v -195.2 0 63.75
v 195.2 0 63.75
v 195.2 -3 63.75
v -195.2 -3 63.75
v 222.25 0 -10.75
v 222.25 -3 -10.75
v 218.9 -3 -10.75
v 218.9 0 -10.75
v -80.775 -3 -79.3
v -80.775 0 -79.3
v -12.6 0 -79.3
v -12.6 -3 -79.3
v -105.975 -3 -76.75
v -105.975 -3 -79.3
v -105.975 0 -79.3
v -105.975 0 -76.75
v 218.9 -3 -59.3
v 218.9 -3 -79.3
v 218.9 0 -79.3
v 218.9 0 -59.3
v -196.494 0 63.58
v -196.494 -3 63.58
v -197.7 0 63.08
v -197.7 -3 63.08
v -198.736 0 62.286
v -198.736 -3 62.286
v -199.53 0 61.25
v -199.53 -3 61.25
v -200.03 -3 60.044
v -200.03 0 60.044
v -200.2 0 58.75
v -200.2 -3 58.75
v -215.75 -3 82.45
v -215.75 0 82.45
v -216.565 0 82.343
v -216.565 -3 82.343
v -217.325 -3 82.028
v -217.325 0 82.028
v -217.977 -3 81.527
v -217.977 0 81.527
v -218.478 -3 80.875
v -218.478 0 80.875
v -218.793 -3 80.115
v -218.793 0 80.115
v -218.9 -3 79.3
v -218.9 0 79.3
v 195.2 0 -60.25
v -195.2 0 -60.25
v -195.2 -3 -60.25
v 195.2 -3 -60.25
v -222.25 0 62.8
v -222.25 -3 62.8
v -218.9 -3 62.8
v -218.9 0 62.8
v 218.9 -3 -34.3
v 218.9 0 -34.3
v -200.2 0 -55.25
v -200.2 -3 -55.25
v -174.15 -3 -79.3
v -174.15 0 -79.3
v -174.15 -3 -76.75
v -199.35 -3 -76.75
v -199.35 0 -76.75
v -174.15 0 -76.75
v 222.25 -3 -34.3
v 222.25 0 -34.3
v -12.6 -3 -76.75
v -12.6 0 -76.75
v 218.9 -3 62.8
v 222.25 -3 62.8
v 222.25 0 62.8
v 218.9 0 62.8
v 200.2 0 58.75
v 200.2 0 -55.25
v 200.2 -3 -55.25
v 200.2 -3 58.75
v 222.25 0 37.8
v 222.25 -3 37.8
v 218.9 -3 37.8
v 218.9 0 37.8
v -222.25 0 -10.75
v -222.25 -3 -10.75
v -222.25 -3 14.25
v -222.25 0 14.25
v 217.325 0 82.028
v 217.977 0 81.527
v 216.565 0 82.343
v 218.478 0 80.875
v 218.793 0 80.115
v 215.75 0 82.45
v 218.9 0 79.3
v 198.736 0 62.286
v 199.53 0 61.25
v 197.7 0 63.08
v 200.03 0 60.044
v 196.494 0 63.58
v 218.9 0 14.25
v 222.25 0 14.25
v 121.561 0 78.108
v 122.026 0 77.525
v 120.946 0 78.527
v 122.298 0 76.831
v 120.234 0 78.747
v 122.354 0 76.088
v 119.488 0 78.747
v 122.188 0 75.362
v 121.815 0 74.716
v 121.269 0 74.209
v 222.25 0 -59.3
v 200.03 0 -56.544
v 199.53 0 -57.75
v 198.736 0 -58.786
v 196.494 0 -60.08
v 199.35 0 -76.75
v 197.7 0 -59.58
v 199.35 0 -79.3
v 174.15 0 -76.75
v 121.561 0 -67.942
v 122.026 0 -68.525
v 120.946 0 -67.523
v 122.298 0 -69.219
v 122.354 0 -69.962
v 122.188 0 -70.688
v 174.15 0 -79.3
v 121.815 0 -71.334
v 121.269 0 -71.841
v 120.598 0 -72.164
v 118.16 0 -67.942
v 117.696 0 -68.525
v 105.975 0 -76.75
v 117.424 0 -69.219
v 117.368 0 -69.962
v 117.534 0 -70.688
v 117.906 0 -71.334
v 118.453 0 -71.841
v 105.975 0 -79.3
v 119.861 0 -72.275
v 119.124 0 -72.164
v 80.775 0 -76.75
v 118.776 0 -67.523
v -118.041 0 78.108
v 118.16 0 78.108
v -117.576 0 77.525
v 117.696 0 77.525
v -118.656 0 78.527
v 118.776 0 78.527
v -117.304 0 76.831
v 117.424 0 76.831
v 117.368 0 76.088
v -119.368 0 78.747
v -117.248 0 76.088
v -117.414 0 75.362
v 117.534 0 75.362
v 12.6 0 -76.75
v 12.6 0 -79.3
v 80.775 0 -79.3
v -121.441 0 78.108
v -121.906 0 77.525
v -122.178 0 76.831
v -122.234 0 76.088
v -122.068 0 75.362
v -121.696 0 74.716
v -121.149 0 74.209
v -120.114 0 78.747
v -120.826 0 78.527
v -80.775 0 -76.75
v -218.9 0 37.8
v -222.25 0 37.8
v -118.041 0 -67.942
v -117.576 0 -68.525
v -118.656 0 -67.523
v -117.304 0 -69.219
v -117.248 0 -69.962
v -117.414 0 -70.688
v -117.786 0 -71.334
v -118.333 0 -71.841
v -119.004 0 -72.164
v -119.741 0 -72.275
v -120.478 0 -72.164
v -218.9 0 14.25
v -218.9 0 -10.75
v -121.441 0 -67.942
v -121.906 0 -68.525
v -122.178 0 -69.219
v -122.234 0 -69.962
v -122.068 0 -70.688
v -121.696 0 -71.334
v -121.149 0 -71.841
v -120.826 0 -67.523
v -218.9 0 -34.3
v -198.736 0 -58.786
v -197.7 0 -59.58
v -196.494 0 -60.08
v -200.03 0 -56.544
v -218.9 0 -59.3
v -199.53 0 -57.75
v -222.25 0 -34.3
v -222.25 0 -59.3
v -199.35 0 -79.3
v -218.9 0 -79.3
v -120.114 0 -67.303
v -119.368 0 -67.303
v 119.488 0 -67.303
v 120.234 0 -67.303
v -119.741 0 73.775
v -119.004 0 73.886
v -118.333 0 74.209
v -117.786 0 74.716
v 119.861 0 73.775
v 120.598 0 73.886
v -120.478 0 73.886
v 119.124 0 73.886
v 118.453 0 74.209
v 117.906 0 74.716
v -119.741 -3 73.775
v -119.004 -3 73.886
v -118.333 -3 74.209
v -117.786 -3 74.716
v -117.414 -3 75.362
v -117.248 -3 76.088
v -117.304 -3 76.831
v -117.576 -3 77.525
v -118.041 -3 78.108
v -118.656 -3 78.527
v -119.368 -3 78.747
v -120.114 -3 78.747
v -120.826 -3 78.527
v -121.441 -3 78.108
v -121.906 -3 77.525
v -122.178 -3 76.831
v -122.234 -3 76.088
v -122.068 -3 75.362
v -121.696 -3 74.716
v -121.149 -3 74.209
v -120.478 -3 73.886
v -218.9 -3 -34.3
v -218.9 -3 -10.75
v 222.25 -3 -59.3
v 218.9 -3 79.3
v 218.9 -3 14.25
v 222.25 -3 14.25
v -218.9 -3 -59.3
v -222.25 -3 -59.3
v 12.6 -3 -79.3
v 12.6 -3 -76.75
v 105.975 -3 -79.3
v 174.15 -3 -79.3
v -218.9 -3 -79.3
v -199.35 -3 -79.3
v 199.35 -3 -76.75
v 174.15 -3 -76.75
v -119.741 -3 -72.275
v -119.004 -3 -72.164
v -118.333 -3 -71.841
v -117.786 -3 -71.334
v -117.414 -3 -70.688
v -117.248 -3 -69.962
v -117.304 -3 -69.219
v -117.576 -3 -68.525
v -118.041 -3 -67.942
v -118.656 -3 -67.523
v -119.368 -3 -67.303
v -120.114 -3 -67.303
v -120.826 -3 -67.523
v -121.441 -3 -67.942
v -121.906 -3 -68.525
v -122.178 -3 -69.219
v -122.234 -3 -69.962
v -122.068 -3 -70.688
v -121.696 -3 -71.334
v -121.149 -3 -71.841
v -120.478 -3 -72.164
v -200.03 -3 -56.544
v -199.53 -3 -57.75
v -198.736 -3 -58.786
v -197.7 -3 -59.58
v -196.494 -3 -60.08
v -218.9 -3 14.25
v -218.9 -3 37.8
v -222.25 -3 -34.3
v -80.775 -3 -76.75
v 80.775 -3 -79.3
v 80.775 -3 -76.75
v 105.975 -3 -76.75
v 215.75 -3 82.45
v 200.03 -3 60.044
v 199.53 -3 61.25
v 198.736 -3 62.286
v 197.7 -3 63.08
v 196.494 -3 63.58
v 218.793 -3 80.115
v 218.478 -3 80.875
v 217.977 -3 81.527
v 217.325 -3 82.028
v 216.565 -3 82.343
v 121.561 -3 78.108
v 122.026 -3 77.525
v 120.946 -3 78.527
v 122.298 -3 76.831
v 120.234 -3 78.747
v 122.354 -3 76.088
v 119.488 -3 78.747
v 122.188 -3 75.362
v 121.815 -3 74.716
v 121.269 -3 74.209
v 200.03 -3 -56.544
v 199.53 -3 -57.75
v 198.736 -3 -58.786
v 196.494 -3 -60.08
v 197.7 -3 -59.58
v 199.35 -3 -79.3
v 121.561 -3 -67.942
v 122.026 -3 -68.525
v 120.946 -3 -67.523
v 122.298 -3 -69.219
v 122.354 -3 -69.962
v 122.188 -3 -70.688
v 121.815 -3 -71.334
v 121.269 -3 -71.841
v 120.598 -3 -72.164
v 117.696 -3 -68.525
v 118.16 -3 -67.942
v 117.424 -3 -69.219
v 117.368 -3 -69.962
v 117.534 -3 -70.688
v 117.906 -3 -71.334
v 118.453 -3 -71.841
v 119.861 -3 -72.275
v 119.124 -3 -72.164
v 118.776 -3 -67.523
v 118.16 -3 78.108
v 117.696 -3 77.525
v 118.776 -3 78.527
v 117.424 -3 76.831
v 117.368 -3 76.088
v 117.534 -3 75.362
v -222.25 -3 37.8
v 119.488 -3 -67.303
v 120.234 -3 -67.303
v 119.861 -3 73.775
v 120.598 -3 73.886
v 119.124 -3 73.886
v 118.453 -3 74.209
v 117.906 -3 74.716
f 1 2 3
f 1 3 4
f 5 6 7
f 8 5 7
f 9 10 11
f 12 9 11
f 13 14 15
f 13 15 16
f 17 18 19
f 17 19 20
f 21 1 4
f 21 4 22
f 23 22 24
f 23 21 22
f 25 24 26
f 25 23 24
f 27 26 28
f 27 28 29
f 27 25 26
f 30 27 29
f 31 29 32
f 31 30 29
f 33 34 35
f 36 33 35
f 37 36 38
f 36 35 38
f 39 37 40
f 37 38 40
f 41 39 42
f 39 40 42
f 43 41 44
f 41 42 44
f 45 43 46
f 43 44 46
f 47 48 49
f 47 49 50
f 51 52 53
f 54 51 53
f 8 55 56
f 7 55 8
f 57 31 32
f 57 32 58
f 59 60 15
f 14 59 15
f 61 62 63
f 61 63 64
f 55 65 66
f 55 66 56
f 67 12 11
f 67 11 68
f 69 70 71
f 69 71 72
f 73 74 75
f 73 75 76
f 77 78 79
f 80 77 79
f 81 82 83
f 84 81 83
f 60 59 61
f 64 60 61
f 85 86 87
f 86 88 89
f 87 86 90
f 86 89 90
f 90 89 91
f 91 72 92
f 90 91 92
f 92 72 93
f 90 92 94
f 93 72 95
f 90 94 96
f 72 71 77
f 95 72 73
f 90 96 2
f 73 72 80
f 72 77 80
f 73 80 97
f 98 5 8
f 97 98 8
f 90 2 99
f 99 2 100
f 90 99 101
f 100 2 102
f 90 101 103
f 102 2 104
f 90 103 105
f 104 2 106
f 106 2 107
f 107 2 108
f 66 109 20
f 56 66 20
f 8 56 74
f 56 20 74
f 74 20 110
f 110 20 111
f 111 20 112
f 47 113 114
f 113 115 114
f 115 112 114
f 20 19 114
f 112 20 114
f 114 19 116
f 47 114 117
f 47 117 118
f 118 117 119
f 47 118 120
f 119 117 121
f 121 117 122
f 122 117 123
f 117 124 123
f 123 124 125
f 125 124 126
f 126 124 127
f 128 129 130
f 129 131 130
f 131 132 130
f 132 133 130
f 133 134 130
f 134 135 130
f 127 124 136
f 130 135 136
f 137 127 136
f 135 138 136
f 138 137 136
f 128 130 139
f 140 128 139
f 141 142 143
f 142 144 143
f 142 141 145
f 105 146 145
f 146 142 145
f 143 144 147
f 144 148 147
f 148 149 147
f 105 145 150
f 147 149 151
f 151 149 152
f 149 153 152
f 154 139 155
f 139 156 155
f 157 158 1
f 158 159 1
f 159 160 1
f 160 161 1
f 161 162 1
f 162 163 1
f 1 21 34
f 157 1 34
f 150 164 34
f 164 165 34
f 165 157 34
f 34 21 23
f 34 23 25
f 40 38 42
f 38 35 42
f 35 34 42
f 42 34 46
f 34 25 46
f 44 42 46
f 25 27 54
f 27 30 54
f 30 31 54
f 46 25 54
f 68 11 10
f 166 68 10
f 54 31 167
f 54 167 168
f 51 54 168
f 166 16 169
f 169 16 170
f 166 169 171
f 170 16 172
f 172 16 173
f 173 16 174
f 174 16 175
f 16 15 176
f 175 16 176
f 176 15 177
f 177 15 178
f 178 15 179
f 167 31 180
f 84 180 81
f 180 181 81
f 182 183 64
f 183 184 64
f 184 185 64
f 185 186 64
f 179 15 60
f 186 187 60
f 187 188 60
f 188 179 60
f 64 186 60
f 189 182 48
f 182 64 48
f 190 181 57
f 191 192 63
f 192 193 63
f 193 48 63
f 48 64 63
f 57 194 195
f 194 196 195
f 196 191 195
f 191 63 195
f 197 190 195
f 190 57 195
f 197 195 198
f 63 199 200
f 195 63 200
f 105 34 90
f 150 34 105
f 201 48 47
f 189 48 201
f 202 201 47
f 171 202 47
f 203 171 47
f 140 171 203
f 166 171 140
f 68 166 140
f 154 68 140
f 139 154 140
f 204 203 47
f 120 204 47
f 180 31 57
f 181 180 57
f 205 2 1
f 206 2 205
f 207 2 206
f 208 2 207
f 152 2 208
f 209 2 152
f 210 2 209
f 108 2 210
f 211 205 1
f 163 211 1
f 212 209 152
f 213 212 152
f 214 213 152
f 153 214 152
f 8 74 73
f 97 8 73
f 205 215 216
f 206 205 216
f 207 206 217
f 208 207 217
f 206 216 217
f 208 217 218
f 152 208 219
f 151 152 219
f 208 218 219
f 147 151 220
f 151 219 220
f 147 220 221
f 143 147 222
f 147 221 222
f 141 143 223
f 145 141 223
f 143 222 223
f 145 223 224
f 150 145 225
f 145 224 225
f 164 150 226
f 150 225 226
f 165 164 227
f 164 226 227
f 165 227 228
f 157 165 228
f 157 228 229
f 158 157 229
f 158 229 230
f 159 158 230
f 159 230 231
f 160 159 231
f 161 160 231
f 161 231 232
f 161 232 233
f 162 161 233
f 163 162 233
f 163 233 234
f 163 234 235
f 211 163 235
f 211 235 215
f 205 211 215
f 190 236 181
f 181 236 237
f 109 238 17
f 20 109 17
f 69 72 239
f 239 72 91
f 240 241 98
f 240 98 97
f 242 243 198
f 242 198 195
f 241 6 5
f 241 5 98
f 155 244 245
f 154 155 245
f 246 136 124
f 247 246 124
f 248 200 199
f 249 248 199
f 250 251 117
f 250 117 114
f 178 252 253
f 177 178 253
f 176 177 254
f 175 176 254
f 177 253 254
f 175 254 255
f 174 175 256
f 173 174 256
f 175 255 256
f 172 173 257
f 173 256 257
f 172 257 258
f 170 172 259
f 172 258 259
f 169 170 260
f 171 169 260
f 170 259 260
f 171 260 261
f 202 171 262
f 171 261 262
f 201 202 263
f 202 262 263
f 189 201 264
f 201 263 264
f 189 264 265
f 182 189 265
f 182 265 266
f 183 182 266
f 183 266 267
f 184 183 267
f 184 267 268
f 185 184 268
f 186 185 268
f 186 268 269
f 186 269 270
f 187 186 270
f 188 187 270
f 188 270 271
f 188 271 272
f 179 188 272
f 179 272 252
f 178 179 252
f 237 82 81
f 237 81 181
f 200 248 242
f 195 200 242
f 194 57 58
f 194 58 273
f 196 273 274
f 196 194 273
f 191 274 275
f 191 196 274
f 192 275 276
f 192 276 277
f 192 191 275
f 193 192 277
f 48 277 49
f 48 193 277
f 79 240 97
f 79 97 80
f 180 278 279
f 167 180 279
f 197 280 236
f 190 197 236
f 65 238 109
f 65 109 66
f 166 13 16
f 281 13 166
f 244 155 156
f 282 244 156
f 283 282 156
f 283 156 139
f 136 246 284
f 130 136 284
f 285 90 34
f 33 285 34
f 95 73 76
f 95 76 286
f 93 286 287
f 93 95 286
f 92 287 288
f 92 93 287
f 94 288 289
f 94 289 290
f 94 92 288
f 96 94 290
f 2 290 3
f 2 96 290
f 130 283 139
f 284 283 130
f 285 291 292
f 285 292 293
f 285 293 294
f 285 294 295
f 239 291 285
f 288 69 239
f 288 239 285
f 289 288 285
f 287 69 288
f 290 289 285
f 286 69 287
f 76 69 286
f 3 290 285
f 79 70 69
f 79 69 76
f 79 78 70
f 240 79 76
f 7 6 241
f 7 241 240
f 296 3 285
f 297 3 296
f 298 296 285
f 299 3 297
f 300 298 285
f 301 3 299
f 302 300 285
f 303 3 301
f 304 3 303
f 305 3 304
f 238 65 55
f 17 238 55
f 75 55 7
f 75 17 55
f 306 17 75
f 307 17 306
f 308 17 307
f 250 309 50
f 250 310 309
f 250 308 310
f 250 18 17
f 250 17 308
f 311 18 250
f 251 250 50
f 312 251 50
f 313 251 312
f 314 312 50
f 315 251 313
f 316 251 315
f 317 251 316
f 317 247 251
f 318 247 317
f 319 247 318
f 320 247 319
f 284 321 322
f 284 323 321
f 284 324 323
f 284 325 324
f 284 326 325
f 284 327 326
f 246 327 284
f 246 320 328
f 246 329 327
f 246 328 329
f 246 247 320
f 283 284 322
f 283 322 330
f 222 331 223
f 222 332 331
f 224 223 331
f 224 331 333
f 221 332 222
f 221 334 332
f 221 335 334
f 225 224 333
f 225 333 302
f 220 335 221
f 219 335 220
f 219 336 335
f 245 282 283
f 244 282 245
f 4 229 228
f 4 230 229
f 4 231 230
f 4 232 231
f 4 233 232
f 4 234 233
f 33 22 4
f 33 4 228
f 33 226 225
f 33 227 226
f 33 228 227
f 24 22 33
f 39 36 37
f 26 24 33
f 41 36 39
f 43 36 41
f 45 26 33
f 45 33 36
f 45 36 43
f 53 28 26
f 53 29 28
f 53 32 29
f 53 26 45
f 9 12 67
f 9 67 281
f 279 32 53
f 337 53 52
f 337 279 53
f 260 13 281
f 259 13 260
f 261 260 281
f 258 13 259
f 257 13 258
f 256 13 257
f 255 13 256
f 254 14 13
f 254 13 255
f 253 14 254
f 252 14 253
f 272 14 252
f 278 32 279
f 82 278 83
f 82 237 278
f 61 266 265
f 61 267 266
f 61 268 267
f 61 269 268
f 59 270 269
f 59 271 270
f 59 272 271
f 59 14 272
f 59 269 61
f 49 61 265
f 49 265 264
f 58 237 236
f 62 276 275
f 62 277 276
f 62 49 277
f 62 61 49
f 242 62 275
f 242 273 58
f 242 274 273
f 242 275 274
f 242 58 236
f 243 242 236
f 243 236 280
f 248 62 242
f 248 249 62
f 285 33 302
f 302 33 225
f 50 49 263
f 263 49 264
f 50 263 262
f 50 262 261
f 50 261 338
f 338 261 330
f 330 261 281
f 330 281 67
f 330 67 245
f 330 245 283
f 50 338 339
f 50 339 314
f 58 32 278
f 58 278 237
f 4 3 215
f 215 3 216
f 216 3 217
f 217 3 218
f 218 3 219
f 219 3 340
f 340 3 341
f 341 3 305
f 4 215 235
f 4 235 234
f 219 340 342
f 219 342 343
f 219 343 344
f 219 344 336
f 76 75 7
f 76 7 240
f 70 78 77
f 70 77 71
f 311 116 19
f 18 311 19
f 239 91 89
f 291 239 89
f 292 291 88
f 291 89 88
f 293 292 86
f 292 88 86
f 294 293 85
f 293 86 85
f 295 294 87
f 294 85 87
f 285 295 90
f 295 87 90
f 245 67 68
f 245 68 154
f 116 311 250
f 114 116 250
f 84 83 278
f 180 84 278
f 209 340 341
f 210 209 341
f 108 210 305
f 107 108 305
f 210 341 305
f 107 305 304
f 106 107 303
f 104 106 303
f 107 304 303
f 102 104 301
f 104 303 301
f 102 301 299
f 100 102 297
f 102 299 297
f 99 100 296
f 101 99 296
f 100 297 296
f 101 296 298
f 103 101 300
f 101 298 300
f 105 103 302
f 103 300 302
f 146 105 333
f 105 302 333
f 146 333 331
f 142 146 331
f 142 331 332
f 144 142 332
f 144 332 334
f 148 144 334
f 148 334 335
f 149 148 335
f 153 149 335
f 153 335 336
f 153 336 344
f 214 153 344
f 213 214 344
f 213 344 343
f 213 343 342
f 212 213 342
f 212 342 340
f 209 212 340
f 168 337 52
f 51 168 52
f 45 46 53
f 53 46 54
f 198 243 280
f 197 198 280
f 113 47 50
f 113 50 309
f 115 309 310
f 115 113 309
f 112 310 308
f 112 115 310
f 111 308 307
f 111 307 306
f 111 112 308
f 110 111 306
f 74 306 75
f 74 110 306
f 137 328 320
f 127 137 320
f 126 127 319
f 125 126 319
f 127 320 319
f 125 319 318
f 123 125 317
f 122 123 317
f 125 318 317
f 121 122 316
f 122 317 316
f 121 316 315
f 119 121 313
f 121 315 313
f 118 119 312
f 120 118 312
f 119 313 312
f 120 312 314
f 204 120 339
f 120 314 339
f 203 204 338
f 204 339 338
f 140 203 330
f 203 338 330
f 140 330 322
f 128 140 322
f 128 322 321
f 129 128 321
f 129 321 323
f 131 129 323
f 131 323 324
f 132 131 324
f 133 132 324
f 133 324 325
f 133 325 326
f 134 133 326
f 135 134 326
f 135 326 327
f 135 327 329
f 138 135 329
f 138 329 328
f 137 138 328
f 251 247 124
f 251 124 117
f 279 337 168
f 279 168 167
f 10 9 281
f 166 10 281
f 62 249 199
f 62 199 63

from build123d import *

# Parameters (mm, degrees)
BASE_FLANGE1_DEPTH  = 3
SKETCH7_W           = 25.2
SKETCH7_H           = 2.55
CUT_EXTRUDE1_DEPTH  = 10
SKETCH8_W           = 3
SKETCH8_H           = 25
BOSS_EXTRUDE1_DEPTH = 3
SKETCH9_W           = 0.35
SKETCH9_H           = 20
SKETCH9_H_2         = 23.55
CUT_EXTRUDE2_DEPTH  = 4.55
CUT_EXTRUDE3_START  = -4.55
CUT_EXTRUDE3_DEPTH  = 4.55
SKETCH11_R          = 2.5
CUT_EXTRUDE4_DEPTH  = 238.069747121


# Sheet-metal steps are written as plain solids
with BuildPart() as part:
    # Sketch1 → Base-Flange1 (new body)
    with BuildSketch(Plane(origin=(0, 0, 0), x_dir=(1, 0, 0), z_dir=(0, 1, 0))):
        with BuildLine():
            Line((-219.25, 79.3), (219.25, 79.3))
            Line((219.25, 79.3), (219.25, -79.3))
            ThreePointArc((219.25, -79.3), (218.224873734, -81.774873734), (215.75, -82.8))
            Line((215.75, -82.8), (-215.75, -82.8))
            ThreePointArc((-215.75, -82.8), (-218.224873734, -81.774873734), (-219.25, -79.3))
            Line((-219.25, -79.3), (-219.25, 79.3))
        make_face()
        with BuildLine():
            Line((-195.2, 60.25), (195.2, 60.25))
            ThreePointArc((195.2, 60.25), (198.735533906, 58.785533906), (200.2, 55.25))
            Line((200.2, 55.25), (200.2, -58.75))
            ThreePointArc((200.2, -58.75), (198.735533906, -62.285533906), (195.2, -63.75))
            Line((195.2, -63.75), (-195.2, -63.75))
            ThreePointArc((-195.2, -63.75), (-198.735533906, -62.285533906), (-200.2, -58.75))
            Line((-200.2, -58.75), (-200.2, 55.25))
            ThreePointArc((-200.2, 55.25), (-198.735533906, 58.785533906), (-195.2, 60.25))
        make_face(mode=Mode.SUBTRACT)
    extrude(amount=-BASE_FLANGE1_DEPTH)

    # Sketch7 → Cut-Extrude1 (cut)
    with BuildSketch(Plane.XZ.offset(3)):
        with Locations((186.75, -78.025)):
            Rectangle(SKETCH7_W, SKETCH7_H)
        with Locations((93.375, -78.025)):
            Rectangle(SKETCH7_W, SKETCH7_H)
        with Locations((0, -78.025)):
            Rectangle(SKETCH7_W, SKETCH7_H)
        with Locations((-93.375, -78.025)):
            Rectangle(SKETCH7_W, SKETCH7_H)
        with Locations((-186.75, -78.025)):
            Rectangle(SKETCH7_W, SKETCH7_H)
    extrude(amount=-CUT_EXTRUDE1_DEPTH, mode=Mode.SUBTRACT)

    # Sketch8 → Boss-Extrude1 (add)
    with BuildSketch(Plane.XZ.offset(3)):
        with Locations((-220.75, -46.8)):
            Rectangle(SKETCH8_W, SKETCH8_H)
        with Locations((-220.75, 1.75)):
            Rectangle(SKETCH8_W, SKETCH8_H)
        with Locations((-220.75, 50.3)):
            Rectangle(SKETCH8_W, SKETCH8_H)
    boss_extrude1 = extrude(amount=-BOSS_EXTRUDE1_DEPTH)

    # Sketch9 → Cut-Extrude2 (cut)
    with BuildSketch(Plane.XZ.offset(3)):
        with Locations((-219.075, -69.3)):
            Rectangle(SKETCH9_W, SKETCH9_H)
        with Locations((-219.075, -22.525)):
            Rectangle(SKETCH9_W, SKETCH9_H_2)
        with Locations((-219.075, 26.025)):
            Rectangle(SKETCH9_W, SKETCH9_H_2)
    cut_extrude2 = extrude(amount=-CUT_EXTRUDE2_DEPTH, mode=Mode.SUBTRACT)

    # Mirror1: Boss-Extrude1, Cut-Extrude2 across plane
    add(boss_extrude1.mirror(Plane(origin=(0, 0, 0), x_dir=(0, 0, 1), z_dir=(1, 0, 0))))
    add(cut_extrude2.mirror(Plane(origin=(0, 0, 0), x_dir=(0, 0, 1), z_dir=(1, 0, 0))), mode=Mode.SUBTRACT)

    # Sketch10 → Cut-Extrude3 (cut)
    with BuildSketch(Plane.XZ.offset(3).offset(CUT_EXTRUDE3_START)):
        with BuildLine():
            Line((219.25, 79.3), (219.25, 62.8))
            Line((219.25, 62.8), (218.9, 62.8))
            Line((218.9, 62.8), (218.9, 79.3))
            ThreePointArc((218.9, 79.3), (217.977386361, 81.527386361), (215.75, 82.45))
            Line((215.75, 82.45), (-215.75, 82.45))
            ThreePointArc((-215.75, 82.45), (-217.977386361, 81.527386361), (-218.9, 79.3))
            Line((-218.9, 79.3), (-218.9, 62.8))
            Line((-218.9, 62.8), (-219.25, 62.8))
            Line((-219.25, 62.8), (-219.25, 79.3))
            ThreePointArc((-219.25, 79.3), (-218.224873734, 81.774873734), (-215.75, 82.8))
            Line((-215.75, 82.8), (215.75, 82.8))
            ThreePointArc((215.75, 82.8), (218.224873734, 81.774873734), (219.25, 79.3))
        make_face()
    extrude(amount=CUT_EXTRUDE3_DEPTH, mode=Mode.SUBTRACT)

    # Sketch11 → Cut-Extrude4 (cut, through all)
    with BuildSketch(Plane.XZ.offset(3)):
        with Locations(Location((-119.740950076, 76.275, 0), (0, 0, 270))):
            Circle(SKETCH11_R)
        with Locations(Location((-119.740950076, -69.775, 0), (0, 0, 270))):
            Circle(SKETCH11_R)
        with Locations(Location((119.860899699, -69.775, 0), (0, 0, 270))):
            Circle(SKETCH11_R)
        with Locations(Location((119.860899699, 76.275, 0), (0, 0, 270))):
            Circle(SKETCH11_R)
    extrude(amount=-CUT_EXTRUDE4_DEPTH, mode=Mode.SUBTRACT)


solid = part.part
